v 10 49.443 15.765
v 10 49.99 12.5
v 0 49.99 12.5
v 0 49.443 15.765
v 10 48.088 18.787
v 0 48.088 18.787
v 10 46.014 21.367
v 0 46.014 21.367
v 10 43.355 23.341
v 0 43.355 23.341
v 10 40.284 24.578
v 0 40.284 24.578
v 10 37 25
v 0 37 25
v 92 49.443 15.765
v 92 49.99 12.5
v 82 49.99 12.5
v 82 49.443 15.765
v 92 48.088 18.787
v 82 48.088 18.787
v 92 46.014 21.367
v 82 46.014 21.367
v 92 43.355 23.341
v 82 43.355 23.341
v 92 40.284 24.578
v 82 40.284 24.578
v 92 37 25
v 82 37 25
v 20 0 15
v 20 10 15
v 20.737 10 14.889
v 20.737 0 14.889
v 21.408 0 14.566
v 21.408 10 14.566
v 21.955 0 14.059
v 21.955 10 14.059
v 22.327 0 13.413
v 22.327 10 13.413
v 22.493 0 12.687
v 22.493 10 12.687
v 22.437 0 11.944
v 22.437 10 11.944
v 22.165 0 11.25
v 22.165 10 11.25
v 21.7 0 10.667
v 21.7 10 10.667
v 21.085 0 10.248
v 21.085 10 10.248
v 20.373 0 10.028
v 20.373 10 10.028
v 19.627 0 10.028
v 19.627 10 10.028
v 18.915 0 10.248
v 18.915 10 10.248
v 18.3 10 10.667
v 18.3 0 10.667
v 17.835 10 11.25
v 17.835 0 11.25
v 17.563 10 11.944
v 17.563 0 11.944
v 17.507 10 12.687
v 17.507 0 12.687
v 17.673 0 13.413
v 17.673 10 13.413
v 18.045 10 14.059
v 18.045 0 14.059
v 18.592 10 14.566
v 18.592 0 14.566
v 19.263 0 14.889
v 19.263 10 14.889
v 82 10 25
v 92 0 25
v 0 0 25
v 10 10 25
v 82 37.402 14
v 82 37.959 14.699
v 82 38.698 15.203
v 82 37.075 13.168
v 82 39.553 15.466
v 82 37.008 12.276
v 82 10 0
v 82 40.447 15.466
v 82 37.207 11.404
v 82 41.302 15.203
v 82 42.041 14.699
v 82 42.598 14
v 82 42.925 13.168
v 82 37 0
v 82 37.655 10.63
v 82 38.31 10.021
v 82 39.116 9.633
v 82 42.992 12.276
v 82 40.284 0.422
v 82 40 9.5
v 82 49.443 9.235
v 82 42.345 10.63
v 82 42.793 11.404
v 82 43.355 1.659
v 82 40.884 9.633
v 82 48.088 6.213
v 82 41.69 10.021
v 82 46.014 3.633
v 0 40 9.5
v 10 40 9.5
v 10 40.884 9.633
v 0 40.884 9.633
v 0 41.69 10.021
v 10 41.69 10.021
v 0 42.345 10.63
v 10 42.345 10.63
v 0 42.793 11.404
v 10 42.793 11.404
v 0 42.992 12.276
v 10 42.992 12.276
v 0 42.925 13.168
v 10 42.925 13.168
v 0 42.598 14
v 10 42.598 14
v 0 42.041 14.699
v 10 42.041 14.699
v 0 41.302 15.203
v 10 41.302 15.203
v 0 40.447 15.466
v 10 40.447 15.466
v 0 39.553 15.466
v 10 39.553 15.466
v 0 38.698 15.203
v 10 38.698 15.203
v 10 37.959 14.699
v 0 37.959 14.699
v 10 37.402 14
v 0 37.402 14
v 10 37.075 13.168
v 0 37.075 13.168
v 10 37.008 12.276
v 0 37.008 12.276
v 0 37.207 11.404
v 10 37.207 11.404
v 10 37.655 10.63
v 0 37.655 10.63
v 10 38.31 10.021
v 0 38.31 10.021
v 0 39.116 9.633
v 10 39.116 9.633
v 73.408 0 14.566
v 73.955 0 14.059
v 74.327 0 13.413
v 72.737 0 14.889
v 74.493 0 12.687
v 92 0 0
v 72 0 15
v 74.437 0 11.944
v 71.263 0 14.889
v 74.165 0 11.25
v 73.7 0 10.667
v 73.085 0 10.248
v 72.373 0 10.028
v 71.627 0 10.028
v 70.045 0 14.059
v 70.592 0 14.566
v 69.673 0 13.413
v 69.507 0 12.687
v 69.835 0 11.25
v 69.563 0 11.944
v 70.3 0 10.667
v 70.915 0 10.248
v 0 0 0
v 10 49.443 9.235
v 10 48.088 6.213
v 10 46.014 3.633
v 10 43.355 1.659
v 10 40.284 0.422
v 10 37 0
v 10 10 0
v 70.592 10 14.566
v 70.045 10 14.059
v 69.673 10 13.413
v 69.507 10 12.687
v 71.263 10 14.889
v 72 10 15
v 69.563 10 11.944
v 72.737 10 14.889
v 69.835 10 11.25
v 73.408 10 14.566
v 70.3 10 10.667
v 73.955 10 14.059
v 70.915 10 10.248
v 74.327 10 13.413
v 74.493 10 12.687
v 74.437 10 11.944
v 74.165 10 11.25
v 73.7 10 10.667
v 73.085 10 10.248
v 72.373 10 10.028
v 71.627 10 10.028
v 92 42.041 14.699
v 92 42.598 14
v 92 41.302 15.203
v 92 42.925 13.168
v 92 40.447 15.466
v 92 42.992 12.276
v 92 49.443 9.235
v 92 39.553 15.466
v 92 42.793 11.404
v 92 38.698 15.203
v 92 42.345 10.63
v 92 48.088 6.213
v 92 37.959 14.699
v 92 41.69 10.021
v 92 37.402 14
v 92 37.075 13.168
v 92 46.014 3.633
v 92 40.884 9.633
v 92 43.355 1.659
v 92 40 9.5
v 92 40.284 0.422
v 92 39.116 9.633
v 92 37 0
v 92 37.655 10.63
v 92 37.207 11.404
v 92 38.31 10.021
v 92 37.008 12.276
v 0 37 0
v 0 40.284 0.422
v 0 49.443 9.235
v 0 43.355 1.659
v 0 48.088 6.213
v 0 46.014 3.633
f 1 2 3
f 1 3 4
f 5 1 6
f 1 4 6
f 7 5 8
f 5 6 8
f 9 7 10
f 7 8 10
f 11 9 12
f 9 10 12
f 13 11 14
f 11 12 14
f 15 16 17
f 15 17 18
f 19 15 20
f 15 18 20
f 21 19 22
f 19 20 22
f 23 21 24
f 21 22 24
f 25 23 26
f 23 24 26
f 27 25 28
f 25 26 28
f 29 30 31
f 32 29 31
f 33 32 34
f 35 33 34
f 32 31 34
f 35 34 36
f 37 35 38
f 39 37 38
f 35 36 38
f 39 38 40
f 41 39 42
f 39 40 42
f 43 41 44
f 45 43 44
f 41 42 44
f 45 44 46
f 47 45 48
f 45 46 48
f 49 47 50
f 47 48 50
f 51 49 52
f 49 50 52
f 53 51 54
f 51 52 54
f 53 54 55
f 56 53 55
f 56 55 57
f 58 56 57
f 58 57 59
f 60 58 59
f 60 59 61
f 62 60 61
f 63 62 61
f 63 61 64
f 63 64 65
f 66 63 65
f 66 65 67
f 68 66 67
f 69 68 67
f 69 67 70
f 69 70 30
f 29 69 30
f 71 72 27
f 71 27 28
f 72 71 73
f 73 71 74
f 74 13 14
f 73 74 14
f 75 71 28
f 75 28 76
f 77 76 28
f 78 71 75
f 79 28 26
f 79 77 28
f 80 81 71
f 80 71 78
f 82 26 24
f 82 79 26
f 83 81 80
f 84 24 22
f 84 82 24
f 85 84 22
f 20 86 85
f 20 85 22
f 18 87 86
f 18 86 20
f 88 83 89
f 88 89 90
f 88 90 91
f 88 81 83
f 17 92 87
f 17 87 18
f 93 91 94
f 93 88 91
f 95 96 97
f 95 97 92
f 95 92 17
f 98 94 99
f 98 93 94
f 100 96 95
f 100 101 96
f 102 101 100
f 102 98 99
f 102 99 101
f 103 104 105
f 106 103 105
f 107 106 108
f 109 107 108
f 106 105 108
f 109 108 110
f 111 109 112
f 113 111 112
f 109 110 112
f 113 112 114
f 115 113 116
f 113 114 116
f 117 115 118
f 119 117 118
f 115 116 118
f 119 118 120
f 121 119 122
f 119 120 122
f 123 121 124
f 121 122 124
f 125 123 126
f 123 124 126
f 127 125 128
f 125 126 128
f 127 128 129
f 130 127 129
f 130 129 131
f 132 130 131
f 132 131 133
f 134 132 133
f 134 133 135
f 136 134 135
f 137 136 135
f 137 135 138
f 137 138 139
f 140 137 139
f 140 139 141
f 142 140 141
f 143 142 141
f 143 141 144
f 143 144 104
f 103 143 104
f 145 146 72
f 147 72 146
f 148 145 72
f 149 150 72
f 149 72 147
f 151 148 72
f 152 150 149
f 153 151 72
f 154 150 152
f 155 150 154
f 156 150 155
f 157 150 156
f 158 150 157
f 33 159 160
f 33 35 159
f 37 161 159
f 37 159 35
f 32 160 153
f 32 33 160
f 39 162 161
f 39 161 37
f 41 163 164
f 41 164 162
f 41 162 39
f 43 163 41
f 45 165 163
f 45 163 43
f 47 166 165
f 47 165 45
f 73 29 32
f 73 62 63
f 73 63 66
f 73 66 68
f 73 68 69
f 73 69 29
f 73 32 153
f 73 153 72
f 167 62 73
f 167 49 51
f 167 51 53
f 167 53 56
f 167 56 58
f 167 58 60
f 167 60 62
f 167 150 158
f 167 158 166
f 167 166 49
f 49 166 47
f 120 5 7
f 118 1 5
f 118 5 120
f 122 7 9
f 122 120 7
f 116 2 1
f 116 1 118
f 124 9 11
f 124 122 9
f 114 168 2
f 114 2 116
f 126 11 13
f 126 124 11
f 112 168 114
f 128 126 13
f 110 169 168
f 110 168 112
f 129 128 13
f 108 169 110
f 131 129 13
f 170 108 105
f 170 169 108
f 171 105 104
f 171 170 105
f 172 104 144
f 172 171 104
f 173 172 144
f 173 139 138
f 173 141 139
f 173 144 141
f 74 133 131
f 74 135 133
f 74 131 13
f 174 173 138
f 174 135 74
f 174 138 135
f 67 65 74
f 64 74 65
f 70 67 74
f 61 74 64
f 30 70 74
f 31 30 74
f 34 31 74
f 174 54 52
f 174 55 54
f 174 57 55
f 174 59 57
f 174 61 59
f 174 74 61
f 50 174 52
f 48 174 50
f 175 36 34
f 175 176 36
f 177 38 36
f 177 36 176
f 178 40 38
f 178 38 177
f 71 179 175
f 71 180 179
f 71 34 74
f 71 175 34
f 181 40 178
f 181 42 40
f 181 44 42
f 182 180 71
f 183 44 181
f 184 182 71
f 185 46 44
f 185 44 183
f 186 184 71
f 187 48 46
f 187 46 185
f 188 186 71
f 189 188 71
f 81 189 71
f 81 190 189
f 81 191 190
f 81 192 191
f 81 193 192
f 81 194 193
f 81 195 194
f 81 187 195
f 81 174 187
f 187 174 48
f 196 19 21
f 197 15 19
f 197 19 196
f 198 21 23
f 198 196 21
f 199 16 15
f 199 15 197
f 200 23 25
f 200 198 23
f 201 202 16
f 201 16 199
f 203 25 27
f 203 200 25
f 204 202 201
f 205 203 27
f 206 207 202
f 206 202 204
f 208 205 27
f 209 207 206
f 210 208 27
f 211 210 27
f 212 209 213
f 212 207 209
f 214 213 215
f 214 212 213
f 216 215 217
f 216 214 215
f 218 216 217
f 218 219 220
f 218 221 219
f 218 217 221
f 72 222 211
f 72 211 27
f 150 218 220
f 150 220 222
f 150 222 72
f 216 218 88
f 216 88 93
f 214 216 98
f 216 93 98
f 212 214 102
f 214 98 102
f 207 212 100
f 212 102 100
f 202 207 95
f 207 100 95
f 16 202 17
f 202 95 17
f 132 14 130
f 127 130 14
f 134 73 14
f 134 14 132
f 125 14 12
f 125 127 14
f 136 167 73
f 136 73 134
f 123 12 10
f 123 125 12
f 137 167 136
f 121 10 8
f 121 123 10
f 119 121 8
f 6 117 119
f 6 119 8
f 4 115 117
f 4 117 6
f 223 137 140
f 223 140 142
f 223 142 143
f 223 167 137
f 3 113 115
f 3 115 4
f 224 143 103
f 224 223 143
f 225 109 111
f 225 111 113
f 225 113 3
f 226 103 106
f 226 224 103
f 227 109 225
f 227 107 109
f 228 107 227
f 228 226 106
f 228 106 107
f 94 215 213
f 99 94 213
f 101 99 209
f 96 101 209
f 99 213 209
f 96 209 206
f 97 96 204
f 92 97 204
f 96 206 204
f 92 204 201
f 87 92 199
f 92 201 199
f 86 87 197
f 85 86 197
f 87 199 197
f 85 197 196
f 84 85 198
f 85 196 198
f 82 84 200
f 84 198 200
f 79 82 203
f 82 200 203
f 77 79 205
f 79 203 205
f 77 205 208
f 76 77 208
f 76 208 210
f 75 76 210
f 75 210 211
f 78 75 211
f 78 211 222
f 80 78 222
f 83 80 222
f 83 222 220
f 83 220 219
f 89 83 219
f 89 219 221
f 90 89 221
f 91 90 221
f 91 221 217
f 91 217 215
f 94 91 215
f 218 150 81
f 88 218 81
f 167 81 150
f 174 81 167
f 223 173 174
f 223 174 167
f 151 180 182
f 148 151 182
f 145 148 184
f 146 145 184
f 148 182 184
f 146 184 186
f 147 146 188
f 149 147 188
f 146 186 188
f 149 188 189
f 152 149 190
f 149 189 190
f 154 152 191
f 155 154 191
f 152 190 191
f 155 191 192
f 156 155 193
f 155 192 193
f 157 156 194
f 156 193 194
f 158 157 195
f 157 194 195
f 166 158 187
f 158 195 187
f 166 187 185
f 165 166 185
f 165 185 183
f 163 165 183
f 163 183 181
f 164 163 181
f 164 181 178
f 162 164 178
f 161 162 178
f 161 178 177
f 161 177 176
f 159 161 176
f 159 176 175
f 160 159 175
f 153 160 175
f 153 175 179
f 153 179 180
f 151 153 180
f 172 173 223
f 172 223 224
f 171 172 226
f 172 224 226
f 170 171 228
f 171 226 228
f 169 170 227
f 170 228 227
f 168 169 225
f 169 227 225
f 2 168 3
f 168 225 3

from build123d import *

# Parameters (mm, degrees)
BOSS_EXTRUDE1_DEPTH = 25
SKETCH2_R           = 3
CUT_EXTRUDE1_DEPTH  = 108.652217813
SKETCH3_R           = 2.5
CUT_EXTRUDE2_DEPTH  = 20
FILLET2_R           = 13


with BuildPart() as part:
    # Sketch1 → Boss-Extrude1 (new body)
    with BuildSketch(Plane.XY):
        Polygon((0, 50), (10, 50), (10, 10), (82, 10), (82, 50), (92, 50), (92, 0), (0, 0), align=None)
    extrude(amount=BOSS_EXTRUDE1_DEPTH)

    # Sketch2 → Cut-Extrude1 (cut, through all)
    with BuildSketch(Plane(origin=(92, 0, 0), x_dir=(0, 0, -1), z_dir=(1, 0, 0))):
        with Locations((-12.5, 40)):
            Circle(SKETCH2_R)
    extrude(amount=-CUT_EXTRUDE1_DEPTH, mode=Mode.SUBTRACT)

    # Sketch3 → Cut-Extrude2 (cut)
    with BuildSketch(Plane(origin=(0, 10, 0), x_dir=(1, 0, 0), z_dir=(0, 1, 0))):
        with Locations(Location((20, -12.5, 0), (0, 0, 270))):
            Circle(SKETCH3_R)
        with Locations(Location((72, -12.5, 0), (0, 0, 270))):
            Circle(SKETCH3_R)
    extrude(amount=-CUT_EXTRUDE2_DEPTH, mode=Mode.SUBTRACT)

    # Fillet2
    # the kernel refuses this fillet: 13 mm, written as the material it takes off along each edge
    with BuildSketch(Plane(origin=(49.5, 50, 0), x_dir=(0, -1, 0), z_dir=(1, 0, 0)), Plane(origin=(-32.5, 50, 25), x_dir=(0, 0, -1), z_dir=(1, 0, 0))) as fillet2_piece_1:
        with BuildLine():
            CenterArc((FILLET2_R, -FILLET2_R), FILLET2_R, 90, 90)
            Line((0, -FILLET2_R), (0, 0))
            Line((0, 0), (FILLET2_R, 0))
        make_face()
    extrude(amount=75, mode=Mode.SUBTRACT)
    with BuildSketch(Plane(origin=(49.5, 50, 25), x_dir=(0, -1, 0), z_dir=(1, 0, 0)), Plane(origin=(-32.5, 50, 0), x_dir=(0, 0, 1), z_dir=(1, 0, 0))) as fillet2_piece_2:
        with BuildLine():
            CenterArc((FILLET2_R, FILLET2_R), FILLET2_R, 180, 90)
            Line((0, FILLET2_R), (0, 0))
            Line((0, 0), (FILLET2_R, 0))
        make_face()
    extrude(amount=75, mode=Mode.SUBTRACT)


solid = part.part
